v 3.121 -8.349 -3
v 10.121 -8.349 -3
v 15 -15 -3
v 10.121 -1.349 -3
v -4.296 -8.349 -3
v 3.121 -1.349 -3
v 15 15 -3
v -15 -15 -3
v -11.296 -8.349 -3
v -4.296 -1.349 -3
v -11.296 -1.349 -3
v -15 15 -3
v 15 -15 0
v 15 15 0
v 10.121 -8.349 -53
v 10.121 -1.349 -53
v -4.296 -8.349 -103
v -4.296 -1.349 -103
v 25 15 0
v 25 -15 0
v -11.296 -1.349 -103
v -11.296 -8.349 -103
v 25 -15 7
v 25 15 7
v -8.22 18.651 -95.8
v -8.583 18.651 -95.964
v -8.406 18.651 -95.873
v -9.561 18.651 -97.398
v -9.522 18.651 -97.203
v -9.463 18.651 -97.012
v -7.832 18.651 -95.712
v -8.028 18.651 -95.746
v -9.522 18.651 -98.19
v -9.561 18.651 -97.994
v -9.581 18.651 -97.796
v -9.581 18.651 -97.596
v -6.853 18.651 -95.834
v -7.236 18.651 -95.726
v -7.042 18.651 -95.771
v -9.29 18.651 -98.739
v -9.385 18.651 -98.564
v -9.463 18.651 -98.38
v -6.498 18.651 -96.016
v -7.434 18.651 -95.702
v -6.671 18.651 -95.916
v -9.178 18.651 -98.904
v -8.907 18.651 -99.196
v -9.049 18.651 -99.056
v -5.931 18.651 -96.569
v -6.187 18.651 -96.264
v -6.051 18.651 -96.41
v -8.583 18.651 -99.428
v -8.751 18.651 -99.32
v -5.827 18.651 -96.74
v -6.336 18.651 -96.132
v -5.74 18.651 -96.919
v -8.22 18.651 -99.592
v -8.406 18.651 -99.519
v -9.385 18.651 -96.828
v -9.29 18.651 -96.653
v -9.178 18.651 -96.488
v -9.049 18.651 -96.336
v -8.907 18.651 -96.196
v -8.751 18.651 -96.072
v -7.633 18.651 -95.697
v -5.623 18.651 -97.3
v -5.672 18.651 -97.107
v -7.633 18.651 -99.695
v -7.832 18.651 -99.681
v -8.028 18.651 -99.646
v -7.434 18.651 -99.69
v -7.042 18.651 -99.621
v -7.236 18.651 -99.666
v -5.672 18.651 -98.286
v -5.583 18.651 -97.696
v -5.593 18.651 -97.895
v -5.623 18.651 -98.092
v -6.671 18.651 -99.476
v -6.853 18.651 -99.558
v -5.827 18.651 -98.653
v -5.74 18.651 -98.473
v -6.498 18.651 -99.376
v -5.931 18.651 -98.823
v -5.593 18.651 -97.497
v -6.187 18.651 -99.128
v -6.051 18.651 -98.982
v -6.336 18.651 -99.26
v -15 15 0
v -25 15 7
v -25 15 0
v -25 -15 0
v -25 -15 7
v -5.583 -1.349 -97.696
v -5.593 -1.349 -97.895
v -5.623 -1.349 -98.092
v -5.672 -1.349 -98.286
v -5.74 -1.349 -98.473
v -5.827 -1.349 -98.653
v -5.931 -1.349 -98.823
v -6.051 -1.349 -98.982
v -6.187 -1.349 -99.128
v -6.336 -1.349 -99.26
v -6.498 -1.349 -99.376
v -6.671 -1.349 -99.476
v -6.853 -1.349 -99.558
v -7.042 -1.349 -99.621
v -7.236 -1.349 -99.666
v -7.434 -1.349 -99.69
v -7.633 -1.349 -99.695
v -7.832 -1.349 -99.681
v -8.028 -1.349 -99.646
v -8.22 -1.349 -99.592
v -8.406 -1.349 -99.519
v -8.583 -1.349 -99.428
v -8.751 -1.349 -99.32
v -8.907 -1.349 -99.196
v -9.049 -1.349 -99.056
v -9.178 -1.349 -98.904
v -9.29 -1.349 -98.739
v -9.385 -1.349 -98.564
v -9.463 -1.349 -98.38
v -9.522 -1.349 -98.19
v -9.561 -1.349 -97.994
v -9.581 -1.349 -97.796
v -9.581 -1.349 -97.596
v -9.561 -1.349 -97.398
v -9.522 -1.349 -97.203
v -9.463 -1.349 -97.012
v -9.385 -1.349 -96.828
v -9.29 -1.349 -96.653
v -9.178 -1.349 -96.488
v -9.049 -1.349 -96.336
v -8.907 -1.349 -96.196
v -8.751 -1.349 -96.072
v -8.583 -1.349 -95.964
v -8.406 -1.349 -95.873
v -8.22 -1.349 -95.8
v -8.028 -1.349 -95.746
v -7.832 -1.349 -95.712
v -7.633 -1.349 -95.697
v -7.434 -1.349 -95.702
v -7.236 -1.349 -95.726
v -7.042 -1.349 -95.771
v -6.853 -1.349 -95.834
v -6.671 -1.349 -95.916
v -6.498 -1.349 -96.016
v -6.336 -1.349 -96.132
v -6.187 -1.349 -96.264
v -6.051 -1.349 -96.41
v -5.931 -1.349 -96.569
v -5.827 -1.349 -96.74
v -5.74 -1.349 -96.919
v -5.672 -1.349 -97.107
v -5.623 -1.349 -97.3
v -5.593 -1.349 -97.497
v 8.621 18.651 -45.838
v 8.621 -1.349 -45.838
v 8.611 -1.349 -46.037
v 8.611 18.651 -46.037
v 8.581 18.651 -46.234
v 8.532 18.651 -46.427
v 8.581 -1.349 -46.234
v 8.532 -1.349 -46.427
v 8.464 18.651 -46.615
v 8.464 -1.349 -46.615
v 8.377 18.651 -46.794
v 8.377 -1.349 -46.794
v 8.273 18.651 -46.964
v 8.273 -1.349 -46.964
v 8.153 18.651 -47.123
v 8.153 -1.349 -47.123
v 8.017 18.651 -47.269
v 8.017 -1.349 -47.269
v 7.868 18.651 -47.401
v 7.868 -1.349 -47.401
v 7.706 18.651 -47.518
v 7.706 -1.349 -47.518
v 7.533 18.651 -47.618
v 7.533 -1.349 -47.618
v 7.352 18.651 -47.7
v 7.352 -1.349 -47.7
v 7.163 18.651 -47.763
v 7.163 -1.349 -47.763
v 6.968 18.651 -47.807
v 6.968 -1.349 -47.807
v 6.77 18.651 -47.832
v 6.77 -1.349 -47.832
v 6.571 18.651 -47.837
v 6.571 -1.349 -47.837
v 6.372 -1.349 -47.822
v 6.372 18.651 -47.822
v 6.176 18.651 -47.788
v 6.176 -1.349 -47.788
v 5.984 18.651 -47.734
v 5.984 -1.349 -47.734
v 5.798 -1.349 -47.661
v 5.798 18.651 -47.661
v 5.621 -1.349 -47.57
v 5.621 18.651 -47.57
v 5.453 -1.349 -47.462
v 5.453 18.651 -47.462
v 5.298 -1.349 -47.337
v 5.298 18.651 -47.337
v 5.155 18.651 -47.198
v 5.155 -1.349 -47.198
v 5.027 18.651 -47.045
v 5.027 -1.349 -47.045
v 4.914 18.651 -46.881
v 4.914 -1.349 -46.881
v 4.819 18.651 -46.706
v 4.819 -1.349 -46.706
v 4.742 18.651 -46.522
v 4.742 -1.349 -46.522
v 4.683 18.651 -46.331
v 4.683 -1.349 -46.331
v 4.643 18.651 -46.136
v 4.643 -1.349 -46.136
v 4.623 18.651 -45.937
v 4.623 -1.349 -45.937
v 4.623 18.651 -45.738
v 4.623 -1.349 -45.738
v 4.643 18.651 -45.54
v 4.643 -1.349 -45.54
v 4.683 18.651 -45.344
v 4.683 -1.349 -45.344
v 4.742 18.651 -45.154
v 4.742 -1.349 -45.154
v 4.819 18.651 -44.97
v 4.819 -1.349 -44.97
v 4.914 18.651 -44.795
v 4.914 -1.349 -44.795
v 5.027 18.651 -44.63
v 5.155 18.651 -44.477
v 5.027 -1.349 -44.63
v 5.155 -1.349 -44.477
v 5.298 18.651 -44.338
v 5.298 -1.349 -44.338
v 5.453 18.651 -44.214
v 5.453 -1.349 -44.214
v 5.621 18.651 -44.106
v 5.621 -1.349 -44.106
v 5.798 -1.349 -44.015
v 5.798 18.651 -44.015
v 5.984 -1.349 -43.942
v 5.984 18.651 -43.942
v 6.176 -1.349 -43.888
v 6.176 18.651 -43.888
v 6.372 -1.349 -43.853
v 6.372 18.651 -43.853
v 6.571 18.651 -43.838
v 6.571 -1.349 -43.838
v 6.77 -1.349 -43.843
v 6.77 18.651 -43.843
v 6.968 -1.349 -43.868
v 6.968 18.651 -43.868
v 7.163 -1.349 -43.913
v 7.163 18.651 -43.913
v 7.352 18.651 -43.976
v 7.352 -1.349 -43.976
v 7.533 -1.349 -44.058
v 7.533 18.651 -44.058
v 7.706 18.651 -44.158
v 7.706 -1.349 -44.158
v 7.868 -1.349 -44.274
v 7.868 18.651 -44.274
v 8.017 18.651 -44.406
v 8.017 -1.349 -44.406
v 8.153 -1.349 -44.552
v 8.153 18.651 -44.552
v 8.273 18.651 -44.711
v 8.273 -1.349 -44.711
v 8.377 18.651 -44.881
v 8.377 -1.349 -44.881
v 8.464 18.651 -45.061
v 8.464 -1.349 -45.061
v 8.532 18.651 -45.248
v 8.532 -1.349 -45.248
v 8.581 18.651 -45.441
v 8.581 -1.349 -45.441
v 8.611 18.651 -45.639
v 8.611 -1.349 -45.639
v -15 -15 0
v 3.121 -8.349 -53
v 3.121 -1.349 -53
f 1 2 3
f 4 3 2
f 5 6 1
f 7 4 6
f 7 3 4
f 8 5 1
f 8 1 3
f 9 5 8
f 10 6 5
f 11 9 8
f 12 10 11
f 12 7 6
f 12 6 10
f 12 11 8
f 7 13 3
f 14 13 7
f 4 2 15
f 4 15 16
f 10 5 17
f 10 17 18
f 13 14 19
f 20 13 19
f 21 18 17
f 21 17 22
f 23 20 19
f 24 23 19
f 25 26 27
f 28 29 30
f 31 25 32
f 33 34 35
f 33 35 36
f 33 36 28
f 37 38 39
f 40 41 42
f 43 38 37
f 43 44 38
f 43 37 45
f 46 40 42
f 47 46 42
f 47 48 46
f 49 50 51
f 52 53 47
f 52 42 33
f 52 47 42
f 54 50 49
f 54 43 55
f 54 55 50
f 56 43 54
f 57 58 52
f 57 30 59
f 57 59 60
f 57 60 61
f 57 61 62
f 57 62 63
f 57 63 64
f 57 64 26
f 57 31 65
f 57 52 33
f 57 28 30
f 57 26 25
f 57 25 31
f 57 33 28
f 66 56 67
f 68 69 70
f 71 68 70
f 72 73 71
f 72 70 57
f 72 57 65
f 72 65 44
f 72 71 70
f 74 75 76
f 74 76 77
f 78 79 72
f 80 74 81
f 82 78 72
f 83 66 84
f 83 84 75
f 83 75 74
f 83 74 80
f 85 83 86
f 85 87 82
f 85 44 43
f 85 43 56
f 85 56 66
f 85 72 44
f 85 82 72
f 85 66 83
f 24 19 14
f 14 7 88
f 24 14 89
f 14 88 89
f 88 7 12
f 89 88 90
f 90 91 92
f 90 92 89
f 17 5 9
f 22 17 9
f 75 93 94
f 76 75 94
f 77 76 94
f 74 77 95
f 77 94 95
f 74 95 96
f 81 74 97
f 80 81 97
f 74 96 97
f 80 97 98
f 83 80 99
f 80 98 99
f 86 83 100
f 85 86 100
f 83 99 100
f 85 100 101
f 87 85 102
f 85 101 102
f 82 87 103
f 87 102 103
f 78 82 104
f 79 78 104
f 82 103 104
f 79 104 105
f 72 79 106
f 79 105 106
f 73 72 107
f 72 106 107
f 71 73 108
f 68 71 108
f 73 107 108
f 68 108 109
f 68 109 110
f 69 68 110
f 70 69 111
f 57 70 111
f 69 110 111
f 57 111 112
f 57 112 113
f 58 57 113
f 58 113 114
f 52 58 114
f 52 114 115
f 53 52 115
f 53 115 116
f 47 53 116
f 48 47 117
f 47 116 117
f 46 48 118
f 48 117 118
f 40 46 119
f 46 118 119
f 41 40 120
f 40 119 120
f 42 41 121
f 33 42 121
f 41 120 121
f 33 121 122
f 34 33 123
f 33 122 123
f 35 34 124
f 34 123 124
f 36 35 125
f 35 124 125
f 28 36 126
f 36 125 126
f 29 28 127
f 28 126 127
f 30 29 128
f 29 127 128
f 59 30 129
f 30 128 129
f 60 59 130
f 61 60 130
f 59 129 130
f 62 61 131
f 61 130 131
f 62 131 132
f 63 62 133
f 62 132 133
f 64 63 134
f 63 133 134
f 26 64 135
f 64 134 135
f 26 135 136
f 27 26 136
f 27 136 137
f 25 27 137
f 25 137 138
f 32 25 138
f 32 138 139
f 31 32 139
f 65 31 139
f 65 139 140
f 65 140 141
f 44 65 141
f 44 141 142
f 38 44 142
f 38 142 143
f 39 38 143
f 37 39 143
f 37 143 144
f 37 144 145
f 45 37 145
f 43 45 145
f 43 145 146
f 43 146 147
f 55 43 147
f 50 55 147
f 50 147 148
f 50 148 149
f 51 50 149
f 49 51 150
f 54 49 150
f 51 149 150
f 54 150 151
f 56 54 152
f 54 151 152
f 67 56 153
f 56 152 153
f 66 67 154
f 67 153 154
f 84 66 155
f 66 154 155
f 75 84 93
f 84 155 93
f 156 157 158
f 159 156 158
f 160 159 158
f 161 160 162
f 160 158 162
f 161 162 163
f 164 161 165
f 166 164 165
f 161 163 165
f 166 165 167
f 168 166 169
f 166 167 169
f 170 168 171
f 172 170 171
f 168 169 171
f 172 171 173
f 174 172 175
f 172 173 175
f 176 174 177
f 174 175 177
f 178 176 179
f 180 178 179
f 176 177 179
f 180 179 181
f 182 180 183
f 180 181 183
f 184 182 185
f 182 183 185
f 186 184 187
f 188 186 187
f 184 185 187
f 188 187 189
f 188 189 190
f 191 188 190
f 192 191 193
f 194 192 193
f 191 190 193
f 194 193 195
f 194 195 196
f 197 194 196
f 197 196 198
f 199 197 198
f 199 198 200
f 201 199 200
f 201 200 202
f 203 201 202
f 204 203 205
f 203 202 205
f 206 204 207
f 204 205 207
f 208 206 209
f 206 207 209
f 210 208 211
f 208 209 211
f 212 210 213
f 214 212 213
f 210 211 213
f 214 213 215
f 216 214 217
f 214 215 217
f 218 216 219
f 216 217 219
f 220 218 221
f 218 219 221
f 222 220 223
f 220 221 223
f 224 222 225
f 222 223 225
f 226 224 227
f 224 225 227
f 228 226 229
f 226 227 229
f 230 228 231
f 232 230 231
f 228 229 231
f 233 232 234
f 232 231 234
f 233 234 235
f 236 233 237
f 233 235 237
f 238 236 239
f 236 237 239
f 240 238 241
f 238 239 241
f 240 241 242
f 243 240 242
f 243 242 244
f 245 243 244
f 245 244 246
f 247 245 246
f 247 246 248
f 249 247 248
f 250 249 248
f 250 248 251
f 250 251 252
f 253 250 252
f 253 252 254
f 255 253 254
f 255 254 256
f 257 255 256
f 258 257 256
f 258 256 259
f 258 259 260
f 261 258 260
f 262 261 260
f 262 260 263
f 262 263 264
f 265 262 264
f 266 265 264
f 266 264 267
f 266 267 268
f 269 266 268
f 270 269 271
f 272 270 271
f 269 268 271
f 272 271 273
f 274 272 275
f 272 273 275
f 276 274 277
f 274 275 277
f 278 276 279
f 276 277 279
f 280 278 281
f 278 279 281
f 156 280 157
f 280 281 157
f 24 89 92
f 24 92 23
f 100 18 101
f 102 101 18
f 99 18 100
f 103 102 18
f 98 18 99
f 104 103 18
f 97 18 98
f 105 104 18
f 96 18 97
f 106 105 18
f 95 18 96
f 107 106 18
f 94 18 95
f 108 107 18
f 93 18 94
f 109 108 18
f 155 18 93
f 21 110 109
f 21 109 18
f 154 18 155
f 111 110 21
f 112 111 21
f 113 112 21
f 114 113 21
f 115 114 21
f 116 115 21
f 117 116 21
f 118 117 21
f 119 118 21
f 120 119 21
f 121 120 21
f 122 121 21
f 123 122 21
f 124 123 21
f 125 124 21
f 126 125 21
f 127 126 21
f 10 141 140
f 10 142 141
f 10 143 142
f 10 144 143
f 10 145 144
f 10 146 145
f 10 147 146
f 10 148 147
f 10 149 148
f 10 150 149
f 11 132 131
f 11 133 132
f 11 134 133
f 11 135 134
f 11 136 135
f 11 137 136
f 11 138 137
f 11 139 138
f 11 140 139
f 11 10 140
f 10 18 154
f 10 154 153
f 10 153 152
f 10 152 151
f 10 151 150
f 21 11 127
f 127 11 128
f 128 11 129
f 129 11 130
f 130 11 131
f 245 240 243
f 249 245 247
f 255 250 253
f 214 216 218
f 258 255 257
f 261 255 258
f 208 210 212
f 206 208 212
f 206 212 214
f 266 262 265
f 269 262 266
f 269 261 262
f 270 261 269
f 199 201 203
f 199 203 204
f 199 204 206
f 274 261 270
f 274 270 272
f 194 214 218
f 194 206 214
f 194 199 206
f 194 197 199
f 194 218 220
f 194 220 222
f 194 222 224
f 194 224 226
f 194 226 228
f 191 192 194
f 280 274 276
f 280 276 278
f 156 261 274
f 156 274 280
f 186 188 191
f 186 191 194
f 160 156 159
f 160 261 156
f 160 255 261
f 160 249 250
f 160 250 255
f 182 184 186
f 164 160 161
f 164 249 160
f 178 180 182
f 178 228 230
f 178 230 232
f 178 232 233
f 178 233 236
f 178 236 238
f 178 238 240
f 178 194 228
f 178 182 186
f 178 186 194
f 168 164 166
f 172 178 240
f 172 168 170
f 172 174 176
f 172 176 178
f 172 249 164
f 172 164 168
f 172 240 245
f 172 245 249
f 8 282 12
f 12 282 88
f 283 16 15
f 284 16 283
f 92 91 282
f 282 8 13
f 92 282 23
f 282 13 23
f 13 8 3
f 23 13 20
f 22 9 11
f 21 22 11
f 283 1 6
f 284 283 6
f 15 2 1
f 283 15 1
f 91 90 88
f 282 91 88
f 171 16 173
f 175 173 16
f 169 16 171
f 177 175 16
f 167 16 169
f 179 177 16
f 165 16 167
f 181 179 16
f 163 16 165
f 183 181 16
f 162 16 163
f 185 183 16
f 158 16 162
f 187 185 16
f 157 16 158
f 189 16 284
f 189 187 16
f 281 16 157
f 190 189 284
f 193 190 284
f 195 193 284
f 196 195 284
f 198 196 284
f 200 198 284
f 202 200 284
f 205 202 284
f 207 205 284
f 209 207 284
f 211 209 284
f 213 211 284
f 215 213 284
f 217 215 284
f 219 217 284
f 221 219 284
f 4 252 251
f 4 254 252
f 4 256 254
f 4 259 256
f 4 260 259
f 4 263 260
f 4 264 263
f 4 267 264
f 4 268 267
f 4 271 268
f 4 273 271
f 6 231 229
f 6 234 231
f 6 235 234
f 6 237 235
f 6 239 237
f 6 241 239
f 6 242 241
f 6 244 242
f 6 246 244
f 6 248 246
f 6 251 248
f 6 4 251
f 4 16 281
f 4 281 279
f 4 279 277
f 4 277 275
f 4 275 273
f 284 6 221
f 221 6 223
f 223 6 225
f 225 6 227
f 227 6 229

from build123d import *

# Parameters (mm, degrees)
SKETCH1_W            = 10
SKETCH1_H            = 30
SKETCH1_W_2          = 30
BOSS_EXTRUDE4_DEPTH  = 7
SKETCH3_W            = 30
SKETCH3_H            = 30
BOSS_EXTRUDE5_DEPTH  = 3
SKETCH4_W            = 7
SKETCH4_H            = 7
BOSS_EXTRUDE8_DEPTH  = 50
SKETCH6_R            = 2
BOSS_EXTRUDE9_DEPTH  = 20
SKETCH7_W            = 7
SKETCH7_H            = 7
BOSS_EXTRUDE13_DEPTH = 100
SKETCH10_R           = 2
BOSS_EXTRUDE14_DEPTH = 20


with BuildPart() as part:
    # Sketch1 → Boss-Extrude4 (new body)
    with BuildSketch(Plane.XY):
        with Locations((-20, 0)):
            Rectangle(SKETCH1_W, SKETCH1_H)
        Rectangle(SKETCH1_W_2, SKETCH1_H)
        with Locations((20, 0)):
            Rectangle(SKETCH1_W, SKETCH1_H)
    extrude(amount=BOSS_EXTRUDE4_DEPTH)

    # Sketch3 → Boss-Extrude5 (add)
    with BuildSketch(Plane(origin=(0, 0, 0), x_dir=(-1, 0, 0), z_dir=(0, 0, -1))):
        Rectangle(SKETCH3_W, SKETCH3_H)
    extrude(amount=BOSS_EXTRUDE5_DEPTH)

    # Sketch4 → Boss-Extrude8 (add)
    with BuildSketch(Plane(origin=(0, 0, -3), x_dir=(-1, 0, 0), z_dir=(0, 0, -1))):
        with Locations((-6.620919375, -4.848854148)):
            Rectangle(SKETCH4_W, SKETCH4_H)
    extrude(amount=BOSS_EXTRUDE8_DEPTH)

    # Sketch6 → Boss-Extrude9 (add)
    with BuildSketch(Plane(origin=(0, -1.348854148, 0), x_dir=(1, 0, 0), z_dir=(0, 1, 0))):
        with Locations((6.620919375, 45.83776359)):
            Circle(SKETCH6_R)
    extrude(amount=BOSS_EXTRUDE9_DEPTH)

    # Sketch7 → Boss-Extrude13 (add)
    with BuildSketch(Plane(origin=(0, 0, -3), x_dir=(-1, 0, 0), z_dir=(0, 0, -1))):
        with Locations((7.796290003, -4.848854148)):
            Rectangle(SKETCH7_W, SKETCH7_H)
    extrude(amount=BOSS_EXTRUDE13_DEPTH)

    # Sketch10 → Boss-Extrude14 (add)
    with BuildSketch(Plane(origin=(0, -1.348854148, 0), x_dir=(1, 0, 0), z_dir=(0, 1, 0))):
        with Locations((-7.583363056, 97.696042798)):
            Circle(SKETCH10_R)
    extrude(amount=BOSS_EXTRUDE14_DEPTH)


solid = part.part
